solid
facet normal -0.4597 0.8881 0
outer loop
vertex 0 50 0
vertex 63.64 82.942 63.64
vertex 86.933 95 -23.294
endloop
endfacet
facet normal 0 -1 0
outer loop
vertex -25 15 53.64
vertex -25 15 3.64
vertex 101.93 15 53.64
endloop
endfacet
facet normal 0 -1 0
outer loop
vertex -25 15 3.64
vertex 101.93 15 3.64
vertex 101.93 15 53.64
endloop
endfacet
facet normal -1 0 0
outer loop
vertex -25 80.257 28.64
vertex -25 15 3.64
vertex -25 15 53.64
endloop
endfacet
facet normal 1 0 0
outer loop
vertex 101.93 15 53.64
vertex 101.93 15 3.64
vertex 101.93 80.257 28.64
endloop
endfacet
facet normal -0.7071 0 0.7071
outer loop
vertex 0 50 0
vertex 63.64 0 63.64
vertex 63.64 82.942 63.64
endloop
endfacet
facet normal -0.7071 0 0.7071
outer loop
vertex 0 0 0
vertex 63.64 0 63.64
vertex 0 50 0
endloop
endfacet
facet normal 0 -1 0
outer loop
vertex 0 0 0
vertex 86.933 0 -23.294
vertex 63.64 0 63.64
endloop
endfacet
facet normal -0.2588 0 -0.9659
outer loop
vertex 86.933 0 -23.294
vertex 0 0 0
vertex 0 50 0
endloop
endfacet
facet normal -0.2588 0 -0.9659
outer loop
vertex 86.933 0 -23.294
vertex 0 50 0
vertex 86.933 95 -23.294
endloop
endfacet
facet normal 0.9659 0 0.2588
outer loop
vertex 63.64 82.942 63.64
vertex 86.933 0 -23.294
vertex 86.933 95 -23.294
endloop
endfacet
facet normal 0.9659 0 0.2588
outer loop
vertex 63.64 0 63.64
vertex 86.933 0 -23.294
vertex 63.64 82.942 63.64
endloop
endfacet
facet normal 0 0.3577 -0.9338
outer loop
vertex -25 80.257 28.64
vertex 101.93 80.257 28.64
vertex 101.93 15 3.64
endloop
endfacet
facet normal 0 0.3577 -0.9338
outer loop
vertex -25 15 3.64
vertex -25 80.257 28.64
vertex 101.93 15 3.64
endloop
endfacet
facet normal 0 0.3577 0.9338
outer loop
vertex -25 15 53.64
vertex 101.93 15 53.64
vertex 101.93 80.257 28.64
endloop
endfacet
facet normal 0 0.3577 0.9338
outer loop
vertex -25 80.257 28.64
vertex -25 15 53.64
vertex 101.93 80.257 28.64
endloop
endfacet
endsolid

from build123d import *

# Parameters (mm, degrees)
EXTRUDE1_DEPTH      = 95
CUT_EXTRUDE1_DEPTH  = 67.5
EXTRUDE2_DEPTH      = 101.93
EXTRUDE2_DEPTH_BACK = 25


with BuildPart() as part:
    # Sketch1 → Extrude1 (new body)
    with BuildSketch(Plane(origin=(0, 0, 0), x_dir=(1, 0, 0), z_dir=(0, 1, 0))):
        Polygon((0, 0), (86.933324366, 23.293714059), (63.639610307, -63.639610307), align=None)
    extrude(amount=EXTRUDE1_DEPTH)

    # Sketch2 → Cut-Extrude1 (cut, symmetric)
    with BuildSketch(Plane.XY):
        Polygon((86.933324366, 95), (0, 50), (0, 95), align=None)
    extrude(amount=CUT_EXTRUDE1_DEPTH, both=True, mode=Mode.SUBTRACT)


with BuildPart() as body_2:
    # Sketch3 → Extrude2 (new body, two sides)
    with BuildSketch(Plane(origin=(0, 0, 0), x_dir=(0, 0, -1), z_dir=(1, 0, 0))) as extrude2_sk:
        Polygon((-28.639610307, 80.257082111), (-3.639610307, 15), (-53.639610307, 15), align=None)
    extrude(amount=EXTRUDE2_DEPTH)
    extrude(extrude2_sk.sketch, amount=-EXTRUDE2_DEPTH_BACK)


solid = Compound([part.part, body_2.part])
